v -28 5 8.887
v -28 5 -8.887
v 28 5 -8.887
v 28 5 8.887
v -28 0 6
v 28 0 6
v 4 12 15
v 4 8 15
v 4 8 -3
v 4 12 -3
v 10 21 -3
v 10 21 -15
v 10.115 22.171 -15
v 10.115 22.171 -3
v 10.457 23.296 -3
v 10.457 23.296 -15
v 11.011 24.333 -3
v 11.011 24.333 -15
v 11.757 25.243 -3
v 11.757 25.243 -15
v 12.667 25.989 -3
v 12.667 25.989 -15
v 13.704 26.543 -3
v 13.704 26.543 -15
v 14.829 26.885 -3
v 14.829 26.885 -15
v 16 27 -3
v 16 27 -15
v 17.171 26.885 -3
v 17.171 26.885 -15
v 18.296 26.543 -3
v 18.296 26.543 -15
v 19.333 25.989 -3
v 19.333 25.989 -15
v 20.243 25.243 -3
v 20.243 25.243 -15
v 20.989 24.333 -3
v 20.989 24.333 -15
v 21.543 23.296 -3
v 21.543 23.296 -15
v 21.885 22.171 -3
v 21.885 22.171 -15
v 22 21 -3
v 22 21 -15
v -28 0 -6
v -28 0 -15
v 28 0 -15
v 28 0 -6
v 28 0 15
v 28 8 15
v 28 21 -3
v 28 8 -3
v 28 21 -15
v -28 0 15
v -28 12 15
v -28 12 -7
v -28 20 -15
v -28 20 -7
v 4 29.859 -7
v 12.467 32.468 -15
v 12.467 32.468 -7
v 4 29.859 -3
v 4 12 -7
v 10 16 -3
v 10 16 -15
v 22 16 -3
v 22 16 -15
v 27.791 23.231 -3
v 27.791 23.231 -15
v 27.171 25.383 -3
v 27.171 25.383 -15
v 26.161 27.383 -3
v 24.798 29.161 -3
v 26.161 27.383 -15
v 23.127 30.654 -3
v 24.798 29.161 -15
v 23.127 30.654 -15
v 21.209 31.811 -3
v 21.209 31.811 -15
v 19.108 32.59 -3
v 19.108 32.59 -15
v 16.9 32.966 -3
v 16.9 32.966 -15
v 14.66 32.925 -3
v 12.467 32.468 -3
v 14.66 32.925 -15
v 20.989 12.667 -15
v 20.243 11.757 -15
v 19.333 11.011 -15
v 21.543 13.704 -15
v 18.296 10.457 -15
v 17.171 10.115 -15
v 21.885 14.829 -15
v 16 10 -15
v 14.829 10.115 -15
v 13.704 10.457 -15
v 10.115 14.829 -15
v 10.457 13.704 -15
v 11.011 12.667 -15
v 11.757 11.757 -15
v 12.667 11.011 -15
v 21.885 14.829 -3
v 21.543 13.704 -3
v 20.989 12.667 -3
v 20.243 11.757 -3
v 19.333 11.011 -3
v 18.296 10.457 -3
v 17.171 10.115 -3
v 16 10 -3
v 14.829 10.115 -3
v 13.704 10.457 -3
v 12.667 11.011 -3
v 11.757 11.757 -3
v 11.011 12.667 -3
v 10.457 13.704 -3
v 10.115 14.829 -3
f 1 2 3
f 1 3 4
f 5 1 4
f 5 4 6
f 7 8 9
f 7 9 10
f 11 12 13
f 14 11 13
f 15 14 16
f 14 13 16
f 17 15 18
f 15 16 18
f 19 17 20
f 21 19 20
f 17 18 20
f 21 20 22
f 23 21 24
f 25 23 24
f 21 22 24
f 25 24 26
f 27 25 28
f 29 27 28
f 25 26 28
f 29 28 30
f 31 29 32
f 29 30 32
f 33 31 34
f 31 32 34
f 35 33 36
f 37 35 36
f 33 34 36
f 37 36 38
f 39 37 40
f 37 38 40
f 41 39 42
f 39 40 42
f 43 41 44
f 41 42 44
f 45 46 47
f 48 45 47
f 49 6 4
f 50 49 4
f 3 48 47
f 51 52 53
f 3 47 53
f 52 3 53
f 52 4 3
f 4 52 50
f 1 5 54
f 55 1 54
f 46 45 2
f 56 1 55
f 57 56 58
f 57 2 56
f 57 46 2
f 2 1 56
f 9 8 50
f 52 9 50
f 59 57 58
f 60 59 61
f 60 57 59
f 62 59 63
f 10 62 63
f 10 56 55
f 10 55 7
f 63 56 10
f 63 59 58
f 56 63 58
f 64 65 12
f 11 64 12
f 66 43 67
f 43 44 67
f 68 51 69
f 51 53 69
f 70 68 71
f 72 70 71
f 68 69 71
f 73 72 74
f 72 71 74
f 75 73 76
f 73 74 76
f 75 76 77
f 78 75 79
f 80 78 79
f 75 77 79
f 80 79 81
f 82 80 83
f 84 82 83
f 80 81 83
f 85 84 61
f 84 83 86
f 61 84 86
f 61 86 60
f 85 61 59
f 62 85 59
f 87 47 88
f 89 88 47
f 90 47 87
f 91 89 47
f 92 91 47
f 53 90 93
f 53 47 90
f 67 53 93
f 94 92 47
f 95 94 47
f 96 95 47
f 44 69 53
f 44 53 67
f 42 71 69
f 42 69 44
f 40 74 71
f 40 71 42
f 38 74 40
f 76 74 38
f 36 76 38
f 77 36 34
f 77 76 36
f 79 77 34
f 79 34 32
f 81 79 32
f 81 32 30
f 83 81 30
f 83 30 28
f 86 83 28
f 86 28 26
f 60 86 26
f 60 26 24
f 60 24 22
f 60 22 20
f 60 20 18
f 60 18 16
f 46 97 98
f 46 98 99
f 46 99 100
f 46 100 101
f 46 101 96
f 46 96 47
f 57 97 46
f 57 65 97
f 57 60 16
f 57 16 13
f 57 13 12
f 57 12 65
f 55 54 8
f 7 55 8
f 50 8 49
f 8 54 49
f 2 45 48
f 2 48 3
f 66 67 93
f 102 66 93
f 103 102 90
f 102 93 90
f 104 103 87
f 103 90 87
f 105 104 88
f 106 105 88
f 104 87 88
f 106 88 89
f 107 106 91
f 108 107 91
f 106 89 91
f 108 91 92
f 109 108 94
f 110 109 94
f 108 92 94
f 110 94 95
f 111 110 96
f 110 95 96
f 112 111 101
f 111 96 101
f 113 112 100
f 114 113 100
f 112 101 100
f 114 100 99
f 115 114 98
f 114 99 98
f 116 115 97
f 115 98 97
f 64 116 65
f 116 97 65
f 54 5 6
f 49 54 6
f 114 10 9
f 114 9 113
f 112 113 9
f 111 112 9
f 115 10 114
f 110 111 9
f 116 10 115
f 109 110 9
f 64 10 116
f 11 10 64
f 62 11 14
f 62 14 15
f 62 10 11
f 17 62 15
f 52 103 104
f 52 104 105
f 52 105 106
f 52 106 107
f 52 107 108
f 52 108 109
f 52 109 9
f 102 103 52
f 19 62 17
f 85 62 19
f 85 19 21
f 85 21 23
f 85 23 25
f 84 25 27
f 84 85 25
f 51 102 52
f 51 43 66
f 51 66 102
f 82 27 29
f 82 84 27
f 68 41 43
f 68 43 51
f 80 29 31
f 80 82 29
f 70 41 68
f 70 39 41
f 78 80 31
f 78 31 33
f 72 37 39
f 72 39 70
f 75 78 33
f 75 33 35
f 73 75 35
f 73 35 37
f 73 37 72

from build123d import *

# Parameters (mm, degrees)
SKETCH_1_W          = 56
SKETCH_1_H          = 30
EXTRUDE_1_DEPTH     = 12
CUT_EXTRUDE_1_DEPTH = 60.203040462
SKETCH_3_W          = 24
SKETCH_3_H          = 4
CUT_EXTRUDE_2_DEPTH = 43.755116653
EXTRUDE_2_DEPTH     = 8
EXTRUDE_3_DEPTH     = 4


with BuildPart() as part:
    # 草图1 → 凸台-拉伸1 (new body)
    with BuildSketch(Plane(origin=(0, 0, 0), x_dir=(1, 0, 0), z_dir=(0, 1, 0))):
        Rectangle(SKETCH_1_W, SKETCH_1_H)
    extrude(amount=EXTRUDE_1_DEPTH)

    # 草图2 → 切除-拉伸1 (cut, through all)
    with BuildSketch(Plane.ZY.offset(28)):
        Polygon((-6, 0), (-8.886751346, 5), (8.886751346, 5), (6, 0), align=None)
    extrude(amount=-CUT_EXTRUDE_1_DEPTH, mode=Mode.SUBTRACT)

    # 草图3 → 切除-拉伸2 (cut, through all)
    with BuildSketch(Plane.XY.offset(15)):
        with Locations((16, 10)):
            Rectangle(SKETCH_3_W, SKETCH_3_H)
    extrude(amount=-CUT_EXTRUDE_2_DEPTH, mode=Mode.SUBTRACT)

    # 草图4 → 凸台-拉伸2 (add)
    # profile 1 of 2: a face of its own
    with BuildSketch(Plane(origin=(0, 0, -15), x_dir=(-1, 0, 0), z_dir=(0, 0, -1))):
        with BuildLine():
            ThreePointArc((-12.466636051, 32.468013743), (-6.345975777, 28.127398986), (-4, 21))
            Line((-4, 21), (-4, 12))
            Line((-4, 12), (28, 12))
            Line((28, 12), (28, 20))
            Line((28, 20), (-12.466636051, 32.468013743))
        make_face()
    # profile 2 of 2: a face of its own
    with BuildSketch(Plane(origin=(0, 0, -15), x_dir=(-1, 0, 0), z_dir=(0, 0, -1))):
        with BuildLine():
            Line((-4, 12), (-4, 21))
            ThreePointArc((-4, 21), (-6.345975777, 28.127398986), (-12.466636051, 32.468013743))
            ThreePointArc((-12.466636051, 32.468013743), (-23.127398986, 30.654024223), (-28, 21))
            Line((-28, 21), (-28, 8))
            Line((-28, 8), (-4, 8))
            Line((-4, 8), (-4, 12))
        make_face()
        with BuildLine():
            ThreePointArc((-10, 16), (-16, 10), (-22, 16))
            Line((-22, 16), (-22, 21))
            ThreePointArc((-22, 21), (-16, 27), (-10, 21))
            Line((-10, 21), (-10, 16))
        make_face(mode=Mode.SUBTRACT)
    extrude(amount=-EXTRUDE_2_DEPTH)

    # 草图5 → 凸台-拉伸3 (add)
    with BuildSketch(Plane.XY.offset(-7)):
        with BuildLine():
            Line((28, 8), (28, 21))
            ThreePointArc((28, 21), (23.127398986, 30.654024223), (12.466636051, 32.468013743))
            Line((12.466636051, 32.468013743), (4, 29.859392297))
            Line((4, 29.859392297), (4, 12))
            Line((4, 12), (4, 8))
            Line((4, 8), (28, 8))
        make_face()
        with BuildLine():
            Line((22, 21), (22, 16))
            ThreePointArc((22, 16), (16, 10), (10, 16))
            Line((10, 16), (10, 21))
            ThreePointArc((10, 21), (16, 27), (22, 21))
        make_face(mode=Mode.SUBTRACT)
    extrude(amount=EXTRUDE_3_DEPTH)


solid = part.part
